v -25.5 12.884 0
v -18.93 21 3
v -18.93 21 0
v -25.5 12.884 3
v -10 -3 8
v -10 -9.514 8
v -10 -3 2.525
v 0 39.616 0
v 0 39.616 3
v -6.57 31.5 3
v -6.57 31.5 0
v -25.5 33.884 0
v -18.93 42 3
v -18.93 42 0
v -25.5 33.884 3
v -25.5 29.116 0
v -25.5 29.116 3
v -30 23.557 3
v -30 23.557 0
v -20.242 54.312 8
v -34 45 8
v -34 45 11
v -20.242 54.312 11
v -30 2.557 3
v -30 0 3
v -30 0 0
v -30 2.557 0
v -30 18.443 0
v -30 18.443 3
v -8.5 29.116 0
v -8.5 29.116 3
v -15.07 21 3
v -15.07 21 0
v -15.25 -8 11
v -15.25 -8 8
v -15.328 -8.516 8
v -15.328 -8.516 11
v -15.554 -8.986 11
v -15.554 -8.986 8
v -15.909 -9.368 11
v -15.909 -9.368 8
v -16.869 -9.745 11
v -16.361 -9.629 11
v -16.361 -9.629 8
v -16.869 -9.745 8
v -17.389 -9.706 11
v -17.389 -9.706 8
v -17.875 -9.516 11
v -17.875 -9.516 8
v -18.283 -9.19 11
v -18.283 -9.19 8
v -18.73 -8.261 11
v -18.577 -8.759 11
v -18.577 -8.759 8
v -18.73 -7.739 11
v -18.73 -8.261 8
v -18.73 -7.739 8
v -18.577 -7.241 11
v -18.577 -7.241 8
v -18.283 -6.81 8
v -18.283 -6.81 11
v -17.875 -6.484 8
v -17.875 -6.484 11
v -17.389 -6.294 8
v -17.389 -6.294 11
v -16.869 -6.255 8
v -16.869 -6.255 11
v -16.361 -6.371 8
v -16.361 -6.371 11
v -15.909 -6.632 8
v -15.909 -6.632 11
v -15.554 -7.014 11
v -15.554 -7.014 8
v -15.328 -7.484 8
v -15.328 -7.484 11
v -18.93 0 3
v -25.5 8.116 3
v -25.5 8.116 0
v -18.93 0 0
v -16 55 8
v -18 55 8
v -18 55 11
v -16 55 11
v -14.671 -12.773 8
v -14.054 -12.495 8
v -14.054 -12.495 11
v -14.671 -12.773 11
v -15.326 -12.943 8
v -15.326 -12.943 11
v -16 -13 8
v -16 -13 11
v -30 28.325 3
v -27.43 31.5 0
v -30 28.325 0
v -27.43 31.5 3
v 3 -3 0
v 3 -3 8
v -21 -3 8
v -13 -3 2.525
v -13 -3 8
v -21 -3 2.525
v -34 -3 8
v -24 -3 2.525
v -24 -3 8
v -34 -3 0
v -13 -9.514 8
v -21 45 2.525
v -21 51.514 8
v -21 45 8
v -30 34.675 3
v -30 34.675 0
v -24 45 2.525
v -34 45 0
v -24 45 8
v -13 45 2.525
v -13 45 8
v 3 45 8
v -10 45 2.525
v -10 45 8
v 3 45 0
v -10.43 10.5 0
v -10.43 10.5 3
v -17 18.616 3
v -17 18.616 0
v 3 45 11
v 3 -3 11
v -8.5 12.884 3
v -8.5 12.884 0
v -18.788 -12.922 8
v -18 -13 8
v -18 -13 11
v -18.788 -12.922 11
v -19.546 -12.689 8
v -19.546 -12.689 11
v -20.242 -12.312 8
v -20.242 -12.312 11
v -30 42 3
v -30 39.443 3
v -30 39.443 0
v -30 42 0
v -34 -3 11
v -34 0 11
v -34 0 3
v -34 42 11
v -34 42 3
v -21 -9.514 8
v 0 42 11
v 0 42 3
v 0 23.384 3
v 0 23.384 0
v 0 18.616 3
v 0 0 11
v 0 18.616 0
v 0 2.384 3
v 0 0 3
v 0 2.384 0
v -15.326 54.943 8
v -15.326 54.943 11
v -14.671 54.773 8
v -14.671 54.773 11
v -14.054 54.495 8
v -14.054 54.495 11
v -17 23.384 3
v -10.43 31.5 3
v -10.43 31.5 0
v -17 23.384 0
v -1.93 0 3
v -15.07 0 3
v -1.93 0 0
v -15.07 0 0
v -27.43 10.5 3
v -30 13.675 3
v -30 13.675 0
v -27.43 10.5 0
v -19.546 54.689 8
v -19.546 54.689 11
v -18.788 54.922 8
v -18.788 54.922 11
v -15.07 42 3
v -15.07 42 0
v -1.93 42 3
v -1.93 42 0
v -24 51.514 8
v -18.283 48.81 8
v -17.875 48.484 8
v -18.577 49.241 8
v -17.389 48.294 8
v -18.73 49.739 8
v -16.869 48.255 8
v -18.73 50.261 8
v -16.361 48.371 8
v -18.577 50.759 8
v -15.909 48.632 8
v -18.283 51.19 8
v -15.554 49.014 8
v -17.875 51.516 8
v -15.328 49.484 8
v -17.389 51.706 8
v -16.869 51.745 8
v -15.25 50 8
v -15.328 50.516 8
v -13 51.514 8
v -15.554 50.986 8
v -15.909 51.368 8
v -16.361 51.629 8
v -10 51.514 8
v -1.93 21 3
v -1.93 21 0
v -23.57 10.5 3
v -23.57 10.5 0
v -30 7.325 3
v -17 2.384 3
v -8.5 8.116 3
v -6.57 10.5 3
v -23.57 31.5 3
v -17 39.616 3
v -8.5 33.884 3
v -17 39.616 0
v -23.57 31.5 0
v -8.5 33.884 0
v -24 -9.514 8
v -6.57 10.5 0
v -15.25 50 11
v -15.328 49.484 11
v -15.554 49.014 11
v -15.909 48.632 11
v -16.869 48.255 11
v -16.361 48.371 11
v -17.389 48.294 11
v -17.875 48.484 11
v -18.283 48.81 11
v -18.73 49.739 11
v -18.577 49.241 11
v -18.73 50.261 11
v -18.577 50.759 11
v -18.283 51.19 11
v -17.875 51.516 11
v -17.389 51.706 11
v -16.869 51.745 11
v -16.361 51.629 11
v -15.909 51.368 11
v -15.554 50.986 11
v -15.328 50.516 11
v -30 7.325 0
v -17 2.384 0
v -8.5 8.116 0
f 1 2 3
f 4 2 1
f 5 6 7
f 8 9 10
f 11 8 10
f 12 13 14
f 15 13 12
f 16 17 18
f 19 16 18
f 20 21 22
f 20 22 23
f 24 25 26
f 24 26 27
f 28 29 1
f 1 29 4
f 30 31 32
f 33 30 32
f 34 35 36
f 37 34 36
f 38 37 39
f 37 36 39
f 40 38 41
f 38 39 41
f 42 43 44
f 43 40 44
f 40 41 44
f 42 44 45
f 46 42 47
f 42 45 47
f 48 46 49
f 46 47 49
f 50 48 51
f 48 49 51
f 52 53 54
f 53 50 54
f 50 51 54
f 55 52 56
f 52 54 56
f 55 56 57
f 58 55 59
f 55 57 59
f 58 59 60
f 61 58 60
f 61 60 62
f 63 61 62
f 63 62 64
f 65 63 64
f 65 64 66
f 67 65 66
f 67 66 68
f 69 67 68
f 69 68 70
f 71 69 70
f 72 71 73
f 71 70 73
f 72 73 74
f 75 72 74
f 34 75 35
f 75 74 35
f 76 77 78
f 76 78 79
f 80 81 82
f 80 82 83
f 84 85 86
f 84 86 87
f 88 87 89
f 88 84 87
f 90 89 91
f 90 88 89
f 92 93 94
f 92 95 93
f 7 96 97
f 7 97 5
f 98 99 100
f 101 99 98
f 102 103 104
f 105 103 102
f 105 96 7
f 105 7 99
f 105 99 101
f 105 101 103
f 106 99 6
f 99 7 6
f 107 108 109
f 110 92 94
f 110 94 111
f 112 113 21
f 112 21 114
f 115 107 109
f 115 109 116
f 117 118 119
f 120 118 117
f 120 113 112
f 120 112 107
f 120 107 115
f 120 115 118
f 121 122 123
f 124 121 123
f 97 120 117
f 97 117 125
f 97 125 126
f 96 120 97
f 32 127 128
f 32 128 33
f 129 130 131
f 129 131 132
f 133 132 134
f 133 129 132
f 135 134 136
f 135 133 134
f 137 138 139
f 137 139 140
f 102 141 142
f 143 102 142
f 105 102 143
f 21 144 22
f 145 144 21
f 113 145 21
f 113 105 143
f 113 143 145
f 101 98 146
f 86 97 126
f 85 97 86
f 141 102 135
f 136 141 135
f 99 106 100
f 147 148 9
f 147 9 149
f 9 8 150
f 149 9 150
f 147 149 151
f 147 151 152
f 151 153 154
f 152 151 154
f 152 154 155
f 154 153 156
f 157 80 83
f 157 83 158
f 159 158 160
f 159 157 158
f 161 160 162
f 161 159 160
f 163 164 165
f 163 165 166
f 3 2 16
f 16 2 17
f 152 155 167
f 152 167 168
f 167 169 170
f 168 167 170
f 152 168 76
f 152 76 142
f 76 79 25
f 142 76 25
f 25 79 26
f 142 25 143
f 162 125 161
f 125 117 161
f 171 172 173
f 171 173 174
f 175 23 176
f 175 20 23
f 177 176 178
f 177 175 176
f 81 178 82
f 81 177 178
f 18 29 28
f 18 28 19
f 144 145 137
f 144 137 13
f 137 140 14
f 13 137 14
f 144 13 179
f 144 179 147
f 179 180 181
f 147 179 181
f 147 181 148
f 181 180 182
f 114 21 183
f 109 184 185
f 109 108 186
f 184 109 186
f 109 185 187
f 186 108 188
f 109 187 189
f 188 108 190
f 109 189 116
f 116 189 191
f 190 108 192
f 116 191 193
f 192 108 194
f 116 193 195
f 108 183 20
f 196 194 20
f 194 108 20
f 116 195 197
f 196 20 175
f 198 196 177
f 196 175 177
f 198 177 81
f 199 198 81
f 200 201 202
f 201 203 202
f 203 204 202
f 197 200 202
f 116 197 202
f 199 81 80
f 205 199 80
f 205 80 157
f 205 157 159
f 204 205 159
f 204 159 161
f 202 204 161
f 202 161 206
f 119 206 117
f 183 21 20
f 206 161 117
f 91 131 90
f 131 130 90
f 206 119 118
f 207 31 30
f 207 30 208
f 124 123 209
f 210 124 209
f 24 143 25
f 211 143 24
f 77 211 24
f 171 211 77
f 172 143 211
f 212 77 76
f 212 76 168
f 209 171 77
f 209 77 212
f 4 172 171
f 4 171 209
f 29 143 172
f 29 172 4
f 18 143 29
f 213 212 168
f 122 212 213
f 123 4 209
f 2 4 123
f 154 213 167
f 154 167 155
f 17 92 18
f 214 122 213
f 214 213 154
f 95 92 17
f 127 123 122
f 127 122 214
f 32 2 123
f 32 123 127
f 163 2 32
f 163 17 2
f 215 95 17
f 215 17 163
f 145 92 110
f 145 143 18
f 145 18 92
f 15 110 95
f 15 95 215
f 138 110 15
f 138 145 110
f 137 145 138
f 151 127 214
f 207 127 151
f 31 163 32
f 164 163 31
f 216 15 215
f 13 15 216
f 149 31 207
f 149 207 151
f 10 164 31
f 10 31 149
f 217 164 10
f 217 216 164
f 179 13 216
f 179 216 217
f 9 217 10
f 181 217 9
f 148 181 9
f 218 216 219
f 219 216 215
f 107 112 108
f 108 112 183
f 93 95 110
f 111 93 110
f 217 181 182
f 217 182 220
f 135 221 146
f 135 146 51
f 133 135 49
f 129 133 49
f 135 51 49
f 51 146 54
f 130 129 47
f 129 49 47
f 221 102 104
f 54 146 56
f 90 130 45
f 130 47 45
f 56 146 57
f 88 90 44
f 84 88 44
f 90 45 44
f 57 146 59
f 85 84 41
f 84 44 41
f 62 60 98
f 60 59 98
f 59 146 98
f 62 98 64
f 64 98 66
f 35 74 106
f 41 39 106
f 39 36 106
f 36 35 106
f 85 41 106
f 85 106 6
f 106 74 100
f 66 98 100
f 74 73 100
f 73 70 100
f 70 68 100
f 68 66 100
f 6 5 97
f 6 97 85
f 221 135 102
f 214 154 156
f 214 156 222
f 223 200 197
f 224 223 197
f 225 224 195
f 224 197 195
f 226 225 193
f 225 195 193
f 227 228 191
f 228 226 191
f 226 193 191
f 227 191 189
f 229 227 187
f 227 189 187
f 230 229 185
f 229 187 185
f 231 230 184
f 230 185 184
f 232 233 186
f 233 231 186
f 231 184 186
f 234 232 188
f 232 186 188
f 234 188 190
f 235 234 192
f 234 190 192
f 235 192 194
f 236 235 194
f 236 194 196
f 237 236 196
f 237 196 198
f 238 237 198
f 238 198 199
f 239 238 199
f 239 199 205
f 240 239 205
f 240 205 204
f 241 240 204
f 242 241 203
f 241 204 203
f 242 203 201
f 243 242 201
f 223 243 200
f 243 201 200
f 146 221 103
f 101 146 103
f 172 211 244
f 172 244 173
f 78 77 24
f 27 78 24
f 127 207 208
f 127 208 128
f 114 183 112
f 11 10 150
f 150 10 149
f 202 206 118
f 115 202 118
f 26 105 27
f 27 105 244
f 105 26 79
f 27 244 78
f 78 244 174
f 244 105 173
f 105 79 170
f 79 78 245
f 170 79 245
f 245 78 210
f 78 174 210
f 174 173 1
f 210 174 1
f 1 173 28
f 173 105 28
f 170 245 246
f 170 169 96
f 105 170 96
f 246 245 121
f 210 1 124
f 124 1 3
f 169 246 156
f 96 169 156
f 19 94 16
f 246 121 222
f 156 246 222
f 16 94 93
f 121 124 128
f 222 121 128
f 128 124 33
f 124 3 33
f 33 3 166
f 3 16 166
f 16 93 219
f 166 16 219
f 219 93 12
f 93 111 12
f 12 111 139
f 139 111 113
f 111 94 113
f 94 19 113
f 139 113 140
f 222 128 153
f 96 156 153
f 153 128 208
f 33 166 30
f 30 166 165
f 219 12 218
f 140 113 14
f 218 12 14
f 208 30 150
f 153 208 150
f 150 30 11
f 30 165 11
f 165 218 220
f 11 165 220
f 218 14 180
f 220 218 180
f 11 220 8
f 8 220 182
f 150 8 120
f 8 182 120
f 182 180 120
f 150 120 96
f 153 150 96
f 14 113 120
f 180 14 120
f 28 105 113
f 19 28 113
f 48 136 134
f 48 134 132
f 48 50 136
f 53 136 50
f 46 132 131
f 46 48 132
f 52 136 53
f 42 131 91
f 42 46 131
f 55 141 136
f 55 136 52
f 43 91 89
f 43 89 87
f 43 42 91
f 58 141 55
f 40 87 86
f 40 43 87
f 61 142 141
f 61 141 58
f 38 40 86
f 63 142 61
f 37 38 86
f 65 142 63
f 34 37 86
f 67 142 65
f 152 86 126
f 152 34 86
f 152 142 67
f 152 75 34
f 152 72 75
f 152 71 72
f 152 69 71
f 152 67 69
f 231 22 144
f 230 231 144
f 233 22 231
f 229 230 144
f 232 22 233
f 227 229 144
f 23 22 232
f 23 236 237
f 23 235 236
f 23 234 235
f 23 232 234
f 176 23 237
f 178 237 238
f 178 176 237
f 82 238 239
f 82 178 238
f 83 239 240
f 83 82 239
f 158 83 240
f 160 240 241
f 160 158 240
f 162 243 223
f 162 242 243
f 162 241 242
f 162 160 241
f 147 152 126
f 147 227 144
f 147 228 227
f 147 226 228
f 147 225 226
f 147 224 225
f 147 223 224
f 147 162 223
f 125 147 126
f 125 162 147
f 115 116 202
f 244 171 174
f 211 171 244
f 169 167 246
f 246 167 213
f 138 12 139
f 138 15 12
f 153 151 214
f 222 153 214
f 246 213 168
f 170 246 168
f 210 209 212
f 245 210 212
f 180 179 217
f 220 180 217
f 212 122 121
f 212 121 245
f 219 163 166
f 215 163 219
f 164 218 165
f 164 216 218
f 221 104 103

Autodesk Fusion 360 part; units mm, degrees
sketch "Sketch1" plane through (0, 0, 0) normal (0, 0, 1) x (1, 0, 0)
  line L0 (0, 0) -> (-34, 0)
  line L1 (-34, 42) -> (0, 42)
  line L2 (0, 42) -> (0, 0)
  line L3 (-34, -3) -> (-34, 45)
  line L4 (3, -3) -> (-34, -3)
  line L5 (-34, 45) -> (3, 45)
  line L6 (3, 45) -> (3, -3)
  line L7 (-18, 55) -> (-16, 55)
  line L8 (-12, 51) -> (-12, 45)
  line L9 (-12, 45) -> (-22, 45)
  line L10 (-22, 45) -> (-22, 51)
  circle A0 centre (-17, 50) radius 1.75
  arc A1 (-18, 55) -> (-22, 51) centre (-18, 51) ccw
  arc A2 (-12, 51) -> (-16, 55) centre (-16, 51) ccw
  circle A3 centre (-17, -8) radius 1.75
  line L11 (-22, -3) -> (-22, -9)
  arc A4 (-22, -9) -> (-18, -13) centre (-18, -9) ccw
  line L12 (-18, -13) -> (-16, -13)
  arc A5 (-16, -13) -> (-12, -9) centre (-16, -9) ccw
  line L13 (-12, -9) -> (-12, -3)
  line L14 (3, 45) -> (-14.0543, 54.4949)
  line L15 (3, -3) -> (-14.0543, -12.4949)
  line L16 (-34, 45) -> (-20.2422, 54.3125)
  line L17 (-34, -3) -> (-20.2422, -12.3125)
  line L18 (-19.75, -9.5877) -> (-17, -11.1754)
  line L19 (-17, -11.1754) -> (-14.25, -9.5877)
  line L20 (-14.25, -9.5877) -> (-14.25, -6.4123)
  line L21 (-14.25, -6.4123) -> (-17, -4.8246)
  line L22 (-17, -4.8246) -> (-19.75, -6.4123)
  line L23 (-19.75, -6.4123) -> (-19.75, -9.5877)
  point P0 (-22, 55)
  point P1 (-12, 55)
  point P2 (-17, -8)
  dimension "d1" = 34
  dimension "d2" = 42
  dimension "d6" = 10
  dimension "d7" = 10
  dimension "d8" = 3.5
  dimension "d9" = 4
  dimension "d24" = 20
  dimension "d43" = 5
  dimension "d79" = 2.75
extrude "Extrude1" add sketch "Sketch1" along normal blind 11 contours L0 L1 L2 L3 L4 L5 L6 L9
extrude "Extrude2" add sketch "Sketch1" along normal blind 3 from surface at 8 contours L4 L11 A4 L17 | L4 L11 A4 L12 A5 L13 | L5 L10 A1 L16 | L4 A5 L13 L15 | L5 L7 L8 L9 L10 A1 A2 | L5 L8 A2 L14 | L18 L19 L20 L21 L22 L23
extrude "Extrude5" add sketch "Sketch1" along normal blind 3 contours L0 L1 L2 L3
ref_plane "WorkPlane3" through (0, 21, 0) normal (0, 1, 0) x (0, 0, 1)
sketch "Sketch5" plane through (0, 0, 3) normal (0, 0, 1) x (-1, 0, 0)
  line L0 (30, 0) -> (30, -42)
  line L1 (34, -42) -> (34, 0)
  line L2 (34, 0) -> (0, 0)
  line L3 (0, 0) -> (0, -42)
  line L4 (0, -42) -> (34, -42)
  line L5 (34, -42) -> (34, 0)
  line L6 (0, -21) -> (17, 0)
  line L7 (0, -42) -> (30, -4.9412)
  line L8 (17, -42) -> (30, -25.9412)
  line L9 (17, -42) -> (0, -21)
  line L10 (0, 0) -> (30, -37.0588)
  line L11 (30, -16.0588) -> (17, 0)
  line L12 (18.1659, -41.0562) -> (1.1659, -20.0562)
  line L13 (15.0701, -42) -> (0, -23.384)
  line L14 (1.9299, -42) -> (30, -7.3252)
  line L15 (0, -39.616) -> (30, -2.5572)
  line L16 (18.9299, -42) -> (30, -28.3252)
  line L17 (15.8341, -41.0562) -> (30, -23.5572)
  line L18 (1.1659, -21.9438) -> (18.1659, -0.9438)
  line L19 (0, -18.616) -> (15.0701, 0)
  line L20 (0, -2.384) -> (30, -39.4428)
  line L21 (1.9299, 0) -> (30, -34.6748)
  line L22 (30, -13.6748) -> (18.9299, 0)
  line L23 (30, -18.4428) -> (15.8341, -0.9438)
  dimension "d64" = 42
  dimension "d65" = 4
  dimension "d66" = 1.5
  dimension "d72" = 1.5
extrude "Extrude6" cut sketch "Sketch5" against normal blind 5 contours L0 L2 L15 L22 | L0 L14 L22 | L0 L4 L16 L20 | L2 L19 L21 | L15 L18 L21 L23 | L0 L14 L17 L21 L23 | L0 L16 L21 | L4 L13 L14 | L3 L19 L20 | L12 L15 L18 L20 | L12 L14 L17 L20 | L3 L13 L15
sketch "Sketch6" plane through (-34, 0, 0) normal (-1, 0, 0) x (0, -1, 0)
  line L0 (-45, 0) -> (3, 0)
  line L1 (3, 0) -> (3, 8)
  line L2 (3, 8) -> (3, 11)
  line L3 (3, 11) -> (0, 11)
  line L4 (0, 11) -> (0, 3)
  line L5 (0, 3) -> (-42, 3)
  line L6 (-42, 3) -> (-42, 11)
  line L7 (-42, 11) -> (-45, 11)
  line L8 (-45, 11) -> (-45, 8)
  line L9 (-45, 8) -> (-45, 0)
  line L10 (3, 8) -> (12.3125, 8)
  line L11 (3, 0) -> (3, 8)
  line L12 (9.5141, 8) -> (3, 2.5254)
extrude "Extrude8" add sketch "Sketch6" against normal blind 3 from surface at -10 contours L1 L10 L11 L12
ref_plane "WorkPlane4" through (-17, 21, 5.5) normal (-1, 0, 0) x (0, -1, 0)
mirror "Mirror4" about plane through (-17, 21, 5.5) normal (-1, 0, 0) of "Extrude8"
mirror "Mirror5" about plane through (0, 21, 0) normal (0, 1, 0) of "Mirror4", "Extrude8"
